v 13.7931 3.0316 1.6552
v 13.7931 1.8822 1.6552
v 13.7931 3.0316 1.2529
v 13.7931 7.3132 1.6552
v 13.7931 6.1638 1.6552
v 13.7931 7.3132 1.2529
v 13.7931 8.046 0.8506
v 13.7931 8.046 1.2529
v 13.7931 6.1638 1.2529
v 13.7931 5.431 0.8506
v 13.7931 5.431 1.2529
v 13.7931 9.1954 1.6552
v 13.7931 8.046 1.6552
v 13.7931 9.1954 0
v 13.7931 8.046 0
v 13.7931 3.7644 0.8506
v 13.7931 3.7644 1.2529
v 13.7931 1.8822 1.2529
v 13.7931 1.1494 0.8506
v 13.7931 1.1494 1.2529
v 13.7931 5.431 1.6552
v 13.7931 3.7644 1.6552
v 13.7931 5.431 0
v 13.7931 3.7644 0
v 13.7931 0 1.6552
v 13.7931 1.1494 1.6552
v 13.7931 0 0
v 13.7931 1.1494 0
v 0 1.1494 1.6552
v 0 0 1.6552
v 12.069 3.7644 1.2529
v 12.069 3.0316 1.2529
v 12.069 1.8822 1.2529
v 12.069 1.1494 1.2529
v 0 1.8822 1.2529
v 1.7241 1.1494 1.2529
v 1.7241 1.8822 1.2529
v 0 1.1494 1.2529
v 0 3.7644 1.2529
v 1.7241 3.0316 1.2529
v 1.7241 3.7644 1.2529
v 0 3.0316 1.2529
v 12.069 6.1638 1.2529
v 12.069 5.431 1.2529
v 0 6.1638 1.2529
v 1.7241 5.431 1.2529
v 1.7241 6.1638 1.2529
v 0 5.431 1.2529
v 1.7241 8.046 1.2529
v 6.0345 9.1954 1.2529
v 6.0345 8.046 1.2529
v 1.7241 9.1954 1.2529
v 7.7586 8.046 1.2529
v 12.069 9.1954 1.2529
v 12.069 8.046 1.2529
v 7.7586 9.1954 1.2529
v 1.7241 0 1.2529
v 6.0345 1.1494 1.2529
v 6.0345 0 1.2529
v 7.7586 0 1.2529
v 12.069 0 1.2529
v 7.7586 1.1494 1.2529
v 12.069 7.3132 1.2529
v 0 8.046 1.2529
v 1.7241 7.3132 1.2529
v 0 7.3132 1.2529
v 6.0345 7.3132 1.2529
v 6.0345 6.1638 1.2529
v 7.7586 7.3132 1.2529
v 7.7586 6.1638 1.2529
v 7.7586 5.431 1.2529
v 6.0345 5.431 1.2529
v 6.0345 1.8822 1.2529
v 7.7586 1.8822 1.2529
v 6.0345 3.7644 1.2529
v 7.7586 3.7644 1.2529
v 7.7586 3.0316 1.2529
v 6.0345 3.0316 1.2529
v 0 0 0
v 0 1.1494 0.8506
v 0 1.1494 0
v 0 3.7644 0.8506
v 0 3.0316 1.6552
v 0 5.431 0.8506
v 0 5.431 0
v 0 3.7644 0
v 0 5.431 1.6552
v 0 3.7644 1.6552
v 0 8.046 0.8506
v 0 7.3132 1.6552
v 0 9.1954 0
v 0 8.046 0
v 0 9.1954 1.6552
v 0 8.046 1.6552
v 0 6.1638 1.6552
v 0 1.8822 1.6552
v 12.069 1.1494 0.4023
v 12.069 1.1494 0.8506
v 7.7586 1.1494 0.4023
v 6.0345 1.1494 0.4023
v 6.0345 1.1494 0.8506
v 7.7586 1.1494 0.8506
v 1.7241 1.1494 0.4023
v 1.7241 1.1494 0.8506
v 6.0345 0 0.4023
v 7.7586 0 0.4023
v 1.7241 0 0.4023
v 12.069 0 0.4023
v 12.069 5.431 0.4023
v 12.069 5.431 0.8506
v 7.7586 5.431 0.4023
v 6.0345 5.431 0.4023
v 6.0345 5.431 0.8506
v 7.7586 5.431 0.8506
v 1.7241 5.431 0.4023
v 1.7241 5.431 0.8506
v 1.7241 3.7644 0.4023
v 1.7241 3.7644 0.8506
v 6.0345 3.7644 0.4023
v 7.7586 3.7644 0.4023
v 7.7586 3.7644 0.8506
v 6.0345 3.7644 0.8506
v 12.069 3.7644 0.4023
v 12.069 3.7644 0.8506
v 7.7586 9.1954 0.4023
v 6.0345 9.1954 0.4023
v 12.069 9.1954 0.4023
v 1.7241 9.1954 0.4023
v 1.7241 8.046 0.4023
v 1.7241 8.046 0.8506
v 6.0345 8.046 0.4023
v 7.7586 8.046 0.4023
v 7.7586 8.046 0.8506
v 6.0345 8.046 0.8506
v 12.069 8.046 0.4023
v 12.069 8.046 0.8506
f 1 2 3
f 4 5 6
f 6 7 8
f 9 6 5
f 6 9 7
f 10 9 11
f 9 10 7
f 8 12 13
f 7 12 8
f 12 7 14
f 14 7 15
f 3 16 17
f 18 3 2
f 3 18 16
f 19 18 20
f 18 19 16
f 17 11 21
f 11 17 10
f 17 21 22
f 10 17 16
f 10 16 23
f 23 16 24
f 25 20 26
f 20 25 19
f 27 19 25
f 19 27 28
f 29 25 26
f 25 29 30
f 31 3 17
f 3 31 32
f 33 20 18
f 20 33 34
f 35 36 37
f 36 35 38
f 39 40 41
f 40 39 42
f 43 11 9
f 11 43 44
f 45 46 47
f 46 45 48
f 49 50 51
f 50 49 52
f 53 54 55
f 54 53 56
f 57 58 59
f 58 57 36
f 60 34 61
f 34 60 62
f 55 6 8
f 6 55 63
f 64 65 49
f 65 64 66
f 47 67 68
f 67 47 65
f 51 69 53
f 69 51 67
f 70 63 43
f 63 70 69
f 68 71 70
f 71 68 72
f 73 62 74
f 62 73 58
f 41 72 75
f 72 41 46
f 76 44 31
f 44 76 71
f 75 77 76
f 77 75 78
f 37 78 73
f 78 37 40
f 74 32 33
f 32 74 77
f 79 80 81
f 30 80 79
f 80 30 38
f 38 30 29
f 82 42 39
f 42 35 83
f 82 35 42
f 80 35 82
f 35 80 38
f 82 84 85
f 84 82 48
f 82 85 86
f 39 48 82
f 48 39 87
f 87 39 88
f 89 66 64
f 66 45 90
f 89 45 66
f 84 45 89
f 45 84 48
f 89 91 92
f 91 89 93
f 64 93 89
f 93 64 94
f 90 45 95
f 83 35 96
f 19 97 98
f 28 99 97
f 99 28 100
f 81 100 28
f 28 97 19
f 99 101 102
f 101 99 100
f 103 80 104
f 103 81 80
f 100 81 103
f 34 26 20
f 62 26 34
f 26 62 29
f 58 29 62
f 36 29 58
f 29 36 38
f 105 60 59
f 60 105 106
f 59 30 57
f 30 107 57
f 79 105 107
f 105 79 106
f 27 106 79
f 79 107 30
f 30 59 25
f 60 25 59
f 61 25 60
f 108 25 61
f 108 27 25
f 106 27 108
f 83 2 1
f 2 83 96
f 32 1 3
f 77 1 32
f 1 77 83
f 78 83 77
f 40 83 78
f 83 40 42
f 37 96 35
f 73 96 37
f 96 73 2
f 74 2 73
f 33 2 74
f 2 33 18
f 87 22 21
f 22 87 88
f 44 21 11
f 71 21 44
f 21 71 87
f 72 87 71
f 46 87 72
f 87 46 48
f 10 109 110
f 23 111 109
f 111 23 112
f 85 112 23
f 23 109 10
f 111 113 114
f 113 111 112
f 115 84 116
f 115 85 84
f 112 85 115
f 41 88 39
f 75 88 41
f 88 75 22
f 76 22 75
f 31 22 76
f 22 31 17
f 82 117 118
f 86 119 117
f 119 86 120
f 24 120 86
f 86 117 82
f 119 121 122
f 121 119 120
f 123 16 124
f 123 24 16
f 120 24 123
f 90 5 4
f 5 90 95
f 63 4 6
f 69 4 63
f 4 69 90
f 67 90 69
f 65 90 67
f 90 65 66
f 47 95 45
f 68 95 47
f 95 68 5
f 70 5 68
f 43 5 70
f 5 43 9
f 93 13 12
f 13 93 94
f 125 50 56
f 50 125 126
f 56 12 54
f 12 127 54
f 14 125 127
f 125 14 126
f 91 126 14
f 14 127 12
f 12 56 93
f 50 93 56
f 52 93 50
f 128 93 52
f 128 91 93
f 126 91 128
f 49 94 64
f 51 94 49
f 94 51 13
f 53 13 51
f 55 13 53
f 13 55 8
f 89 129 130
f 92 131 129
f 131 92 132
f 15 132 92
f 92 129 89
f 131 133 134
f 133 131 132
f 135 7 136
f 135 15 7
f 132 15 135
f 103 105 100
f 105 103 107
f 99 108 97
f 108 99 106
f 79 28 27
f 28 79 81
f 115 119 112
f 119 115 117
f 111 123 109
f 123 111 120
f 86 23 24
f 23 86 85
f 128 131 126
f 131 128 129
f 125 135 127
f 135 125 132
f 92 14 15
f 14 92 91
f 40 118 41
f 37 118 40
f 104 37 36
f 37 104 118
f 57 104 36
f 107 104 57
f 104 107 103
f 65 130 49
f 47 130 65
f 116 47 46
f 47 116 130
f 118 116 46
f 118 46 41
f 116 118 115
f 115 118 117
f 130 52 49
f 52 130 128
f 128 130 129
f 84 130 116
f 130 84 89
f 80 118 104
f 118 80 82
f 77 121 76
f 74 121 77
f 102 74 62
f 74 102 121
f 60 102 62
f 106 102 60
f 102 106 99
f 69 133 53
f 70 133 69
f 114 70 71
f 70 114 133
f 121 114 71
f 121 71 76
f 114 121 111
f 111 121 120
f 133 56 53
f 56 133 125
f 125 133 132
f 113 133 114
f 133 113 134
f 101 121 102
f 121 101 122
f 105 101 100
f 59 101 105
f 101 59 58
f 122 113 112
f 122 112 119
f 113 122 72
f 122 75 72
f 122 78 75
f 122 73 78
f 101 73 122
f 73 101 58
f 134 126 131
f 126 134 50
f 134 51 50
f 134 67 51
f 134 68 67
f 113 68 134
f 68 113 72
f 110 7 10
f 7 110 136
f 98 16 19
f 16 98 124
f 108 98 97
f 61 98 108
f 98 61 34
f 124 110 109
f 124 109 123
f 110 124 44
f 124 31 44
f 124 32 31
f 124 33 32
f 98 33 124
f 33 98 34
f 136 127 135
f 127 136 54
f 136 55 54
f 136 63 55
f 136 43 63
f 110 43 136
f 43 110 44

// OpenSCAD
scale = 87;

width = 800;
length = 1200;
height = 144;

board_height = 35;
board_width = 150;
space = 63.75;
scale([1/scale,1/scale,1/scale]){
//length top
translate([0,0,height-board_height])
cube([length, 100, board_height]);
translate([0,100+(1*space),height-board_height])
cube([length, 100, board_height]);
translate([0,200+(2*space),height-board_height])
cube([length, 145, board_height]);
translate([0,345+(3*space),height-board_height])
cube([length, 100, board_height]);
translate([0,445+(4*space),height-board_height])
cube([length, 100, board_height]);

//length bot
translate([0,0,0])
cube([length, 100, board_height]);
//translate([0,100+(1*space),0])
//cube([length, 100, board_height]);
translate([0,200+(2*space),0])
cube([length, 145, board_height]);
//translate([0,345+(3*space),0])
//cube([length, 100, board_height]);
translate([0,445+(4*space),0])
cube([length, 100, board_height]);

//cross

translate([0,0,height-2*board_height])
cube([150, width, board_height]);
translate([length/2-75,0,height-2*board_height])
cube([150, width, board_height]);
translate([length-150,0,height-2*board_height])
cube([150, width, board_height]);

//cubes
//front
translate([0,0,0])
cube([150, 100, height]);
translate([length/2-75,0,0])
cube([150, 100, height]);
translate([length-150,0,0])
cube([150, 100, height]);
//mid
translate([0,200+(2*space),0])
cube([150, 145, height]);
translate([length/2-75,200+(2*space),0])
cube([150, 145, height]);
translate([length-150,200+(2*space),0])
cube([150, 145, height]);
//back
translate([0,445+(4*space),0])
cube([150, 100, height]);
translate([length/2-75,445+(4*space),0])
cube([150, 100, height]);
translate([length-150,445+(4*space),0])
cube([150, 100, height]);

}
